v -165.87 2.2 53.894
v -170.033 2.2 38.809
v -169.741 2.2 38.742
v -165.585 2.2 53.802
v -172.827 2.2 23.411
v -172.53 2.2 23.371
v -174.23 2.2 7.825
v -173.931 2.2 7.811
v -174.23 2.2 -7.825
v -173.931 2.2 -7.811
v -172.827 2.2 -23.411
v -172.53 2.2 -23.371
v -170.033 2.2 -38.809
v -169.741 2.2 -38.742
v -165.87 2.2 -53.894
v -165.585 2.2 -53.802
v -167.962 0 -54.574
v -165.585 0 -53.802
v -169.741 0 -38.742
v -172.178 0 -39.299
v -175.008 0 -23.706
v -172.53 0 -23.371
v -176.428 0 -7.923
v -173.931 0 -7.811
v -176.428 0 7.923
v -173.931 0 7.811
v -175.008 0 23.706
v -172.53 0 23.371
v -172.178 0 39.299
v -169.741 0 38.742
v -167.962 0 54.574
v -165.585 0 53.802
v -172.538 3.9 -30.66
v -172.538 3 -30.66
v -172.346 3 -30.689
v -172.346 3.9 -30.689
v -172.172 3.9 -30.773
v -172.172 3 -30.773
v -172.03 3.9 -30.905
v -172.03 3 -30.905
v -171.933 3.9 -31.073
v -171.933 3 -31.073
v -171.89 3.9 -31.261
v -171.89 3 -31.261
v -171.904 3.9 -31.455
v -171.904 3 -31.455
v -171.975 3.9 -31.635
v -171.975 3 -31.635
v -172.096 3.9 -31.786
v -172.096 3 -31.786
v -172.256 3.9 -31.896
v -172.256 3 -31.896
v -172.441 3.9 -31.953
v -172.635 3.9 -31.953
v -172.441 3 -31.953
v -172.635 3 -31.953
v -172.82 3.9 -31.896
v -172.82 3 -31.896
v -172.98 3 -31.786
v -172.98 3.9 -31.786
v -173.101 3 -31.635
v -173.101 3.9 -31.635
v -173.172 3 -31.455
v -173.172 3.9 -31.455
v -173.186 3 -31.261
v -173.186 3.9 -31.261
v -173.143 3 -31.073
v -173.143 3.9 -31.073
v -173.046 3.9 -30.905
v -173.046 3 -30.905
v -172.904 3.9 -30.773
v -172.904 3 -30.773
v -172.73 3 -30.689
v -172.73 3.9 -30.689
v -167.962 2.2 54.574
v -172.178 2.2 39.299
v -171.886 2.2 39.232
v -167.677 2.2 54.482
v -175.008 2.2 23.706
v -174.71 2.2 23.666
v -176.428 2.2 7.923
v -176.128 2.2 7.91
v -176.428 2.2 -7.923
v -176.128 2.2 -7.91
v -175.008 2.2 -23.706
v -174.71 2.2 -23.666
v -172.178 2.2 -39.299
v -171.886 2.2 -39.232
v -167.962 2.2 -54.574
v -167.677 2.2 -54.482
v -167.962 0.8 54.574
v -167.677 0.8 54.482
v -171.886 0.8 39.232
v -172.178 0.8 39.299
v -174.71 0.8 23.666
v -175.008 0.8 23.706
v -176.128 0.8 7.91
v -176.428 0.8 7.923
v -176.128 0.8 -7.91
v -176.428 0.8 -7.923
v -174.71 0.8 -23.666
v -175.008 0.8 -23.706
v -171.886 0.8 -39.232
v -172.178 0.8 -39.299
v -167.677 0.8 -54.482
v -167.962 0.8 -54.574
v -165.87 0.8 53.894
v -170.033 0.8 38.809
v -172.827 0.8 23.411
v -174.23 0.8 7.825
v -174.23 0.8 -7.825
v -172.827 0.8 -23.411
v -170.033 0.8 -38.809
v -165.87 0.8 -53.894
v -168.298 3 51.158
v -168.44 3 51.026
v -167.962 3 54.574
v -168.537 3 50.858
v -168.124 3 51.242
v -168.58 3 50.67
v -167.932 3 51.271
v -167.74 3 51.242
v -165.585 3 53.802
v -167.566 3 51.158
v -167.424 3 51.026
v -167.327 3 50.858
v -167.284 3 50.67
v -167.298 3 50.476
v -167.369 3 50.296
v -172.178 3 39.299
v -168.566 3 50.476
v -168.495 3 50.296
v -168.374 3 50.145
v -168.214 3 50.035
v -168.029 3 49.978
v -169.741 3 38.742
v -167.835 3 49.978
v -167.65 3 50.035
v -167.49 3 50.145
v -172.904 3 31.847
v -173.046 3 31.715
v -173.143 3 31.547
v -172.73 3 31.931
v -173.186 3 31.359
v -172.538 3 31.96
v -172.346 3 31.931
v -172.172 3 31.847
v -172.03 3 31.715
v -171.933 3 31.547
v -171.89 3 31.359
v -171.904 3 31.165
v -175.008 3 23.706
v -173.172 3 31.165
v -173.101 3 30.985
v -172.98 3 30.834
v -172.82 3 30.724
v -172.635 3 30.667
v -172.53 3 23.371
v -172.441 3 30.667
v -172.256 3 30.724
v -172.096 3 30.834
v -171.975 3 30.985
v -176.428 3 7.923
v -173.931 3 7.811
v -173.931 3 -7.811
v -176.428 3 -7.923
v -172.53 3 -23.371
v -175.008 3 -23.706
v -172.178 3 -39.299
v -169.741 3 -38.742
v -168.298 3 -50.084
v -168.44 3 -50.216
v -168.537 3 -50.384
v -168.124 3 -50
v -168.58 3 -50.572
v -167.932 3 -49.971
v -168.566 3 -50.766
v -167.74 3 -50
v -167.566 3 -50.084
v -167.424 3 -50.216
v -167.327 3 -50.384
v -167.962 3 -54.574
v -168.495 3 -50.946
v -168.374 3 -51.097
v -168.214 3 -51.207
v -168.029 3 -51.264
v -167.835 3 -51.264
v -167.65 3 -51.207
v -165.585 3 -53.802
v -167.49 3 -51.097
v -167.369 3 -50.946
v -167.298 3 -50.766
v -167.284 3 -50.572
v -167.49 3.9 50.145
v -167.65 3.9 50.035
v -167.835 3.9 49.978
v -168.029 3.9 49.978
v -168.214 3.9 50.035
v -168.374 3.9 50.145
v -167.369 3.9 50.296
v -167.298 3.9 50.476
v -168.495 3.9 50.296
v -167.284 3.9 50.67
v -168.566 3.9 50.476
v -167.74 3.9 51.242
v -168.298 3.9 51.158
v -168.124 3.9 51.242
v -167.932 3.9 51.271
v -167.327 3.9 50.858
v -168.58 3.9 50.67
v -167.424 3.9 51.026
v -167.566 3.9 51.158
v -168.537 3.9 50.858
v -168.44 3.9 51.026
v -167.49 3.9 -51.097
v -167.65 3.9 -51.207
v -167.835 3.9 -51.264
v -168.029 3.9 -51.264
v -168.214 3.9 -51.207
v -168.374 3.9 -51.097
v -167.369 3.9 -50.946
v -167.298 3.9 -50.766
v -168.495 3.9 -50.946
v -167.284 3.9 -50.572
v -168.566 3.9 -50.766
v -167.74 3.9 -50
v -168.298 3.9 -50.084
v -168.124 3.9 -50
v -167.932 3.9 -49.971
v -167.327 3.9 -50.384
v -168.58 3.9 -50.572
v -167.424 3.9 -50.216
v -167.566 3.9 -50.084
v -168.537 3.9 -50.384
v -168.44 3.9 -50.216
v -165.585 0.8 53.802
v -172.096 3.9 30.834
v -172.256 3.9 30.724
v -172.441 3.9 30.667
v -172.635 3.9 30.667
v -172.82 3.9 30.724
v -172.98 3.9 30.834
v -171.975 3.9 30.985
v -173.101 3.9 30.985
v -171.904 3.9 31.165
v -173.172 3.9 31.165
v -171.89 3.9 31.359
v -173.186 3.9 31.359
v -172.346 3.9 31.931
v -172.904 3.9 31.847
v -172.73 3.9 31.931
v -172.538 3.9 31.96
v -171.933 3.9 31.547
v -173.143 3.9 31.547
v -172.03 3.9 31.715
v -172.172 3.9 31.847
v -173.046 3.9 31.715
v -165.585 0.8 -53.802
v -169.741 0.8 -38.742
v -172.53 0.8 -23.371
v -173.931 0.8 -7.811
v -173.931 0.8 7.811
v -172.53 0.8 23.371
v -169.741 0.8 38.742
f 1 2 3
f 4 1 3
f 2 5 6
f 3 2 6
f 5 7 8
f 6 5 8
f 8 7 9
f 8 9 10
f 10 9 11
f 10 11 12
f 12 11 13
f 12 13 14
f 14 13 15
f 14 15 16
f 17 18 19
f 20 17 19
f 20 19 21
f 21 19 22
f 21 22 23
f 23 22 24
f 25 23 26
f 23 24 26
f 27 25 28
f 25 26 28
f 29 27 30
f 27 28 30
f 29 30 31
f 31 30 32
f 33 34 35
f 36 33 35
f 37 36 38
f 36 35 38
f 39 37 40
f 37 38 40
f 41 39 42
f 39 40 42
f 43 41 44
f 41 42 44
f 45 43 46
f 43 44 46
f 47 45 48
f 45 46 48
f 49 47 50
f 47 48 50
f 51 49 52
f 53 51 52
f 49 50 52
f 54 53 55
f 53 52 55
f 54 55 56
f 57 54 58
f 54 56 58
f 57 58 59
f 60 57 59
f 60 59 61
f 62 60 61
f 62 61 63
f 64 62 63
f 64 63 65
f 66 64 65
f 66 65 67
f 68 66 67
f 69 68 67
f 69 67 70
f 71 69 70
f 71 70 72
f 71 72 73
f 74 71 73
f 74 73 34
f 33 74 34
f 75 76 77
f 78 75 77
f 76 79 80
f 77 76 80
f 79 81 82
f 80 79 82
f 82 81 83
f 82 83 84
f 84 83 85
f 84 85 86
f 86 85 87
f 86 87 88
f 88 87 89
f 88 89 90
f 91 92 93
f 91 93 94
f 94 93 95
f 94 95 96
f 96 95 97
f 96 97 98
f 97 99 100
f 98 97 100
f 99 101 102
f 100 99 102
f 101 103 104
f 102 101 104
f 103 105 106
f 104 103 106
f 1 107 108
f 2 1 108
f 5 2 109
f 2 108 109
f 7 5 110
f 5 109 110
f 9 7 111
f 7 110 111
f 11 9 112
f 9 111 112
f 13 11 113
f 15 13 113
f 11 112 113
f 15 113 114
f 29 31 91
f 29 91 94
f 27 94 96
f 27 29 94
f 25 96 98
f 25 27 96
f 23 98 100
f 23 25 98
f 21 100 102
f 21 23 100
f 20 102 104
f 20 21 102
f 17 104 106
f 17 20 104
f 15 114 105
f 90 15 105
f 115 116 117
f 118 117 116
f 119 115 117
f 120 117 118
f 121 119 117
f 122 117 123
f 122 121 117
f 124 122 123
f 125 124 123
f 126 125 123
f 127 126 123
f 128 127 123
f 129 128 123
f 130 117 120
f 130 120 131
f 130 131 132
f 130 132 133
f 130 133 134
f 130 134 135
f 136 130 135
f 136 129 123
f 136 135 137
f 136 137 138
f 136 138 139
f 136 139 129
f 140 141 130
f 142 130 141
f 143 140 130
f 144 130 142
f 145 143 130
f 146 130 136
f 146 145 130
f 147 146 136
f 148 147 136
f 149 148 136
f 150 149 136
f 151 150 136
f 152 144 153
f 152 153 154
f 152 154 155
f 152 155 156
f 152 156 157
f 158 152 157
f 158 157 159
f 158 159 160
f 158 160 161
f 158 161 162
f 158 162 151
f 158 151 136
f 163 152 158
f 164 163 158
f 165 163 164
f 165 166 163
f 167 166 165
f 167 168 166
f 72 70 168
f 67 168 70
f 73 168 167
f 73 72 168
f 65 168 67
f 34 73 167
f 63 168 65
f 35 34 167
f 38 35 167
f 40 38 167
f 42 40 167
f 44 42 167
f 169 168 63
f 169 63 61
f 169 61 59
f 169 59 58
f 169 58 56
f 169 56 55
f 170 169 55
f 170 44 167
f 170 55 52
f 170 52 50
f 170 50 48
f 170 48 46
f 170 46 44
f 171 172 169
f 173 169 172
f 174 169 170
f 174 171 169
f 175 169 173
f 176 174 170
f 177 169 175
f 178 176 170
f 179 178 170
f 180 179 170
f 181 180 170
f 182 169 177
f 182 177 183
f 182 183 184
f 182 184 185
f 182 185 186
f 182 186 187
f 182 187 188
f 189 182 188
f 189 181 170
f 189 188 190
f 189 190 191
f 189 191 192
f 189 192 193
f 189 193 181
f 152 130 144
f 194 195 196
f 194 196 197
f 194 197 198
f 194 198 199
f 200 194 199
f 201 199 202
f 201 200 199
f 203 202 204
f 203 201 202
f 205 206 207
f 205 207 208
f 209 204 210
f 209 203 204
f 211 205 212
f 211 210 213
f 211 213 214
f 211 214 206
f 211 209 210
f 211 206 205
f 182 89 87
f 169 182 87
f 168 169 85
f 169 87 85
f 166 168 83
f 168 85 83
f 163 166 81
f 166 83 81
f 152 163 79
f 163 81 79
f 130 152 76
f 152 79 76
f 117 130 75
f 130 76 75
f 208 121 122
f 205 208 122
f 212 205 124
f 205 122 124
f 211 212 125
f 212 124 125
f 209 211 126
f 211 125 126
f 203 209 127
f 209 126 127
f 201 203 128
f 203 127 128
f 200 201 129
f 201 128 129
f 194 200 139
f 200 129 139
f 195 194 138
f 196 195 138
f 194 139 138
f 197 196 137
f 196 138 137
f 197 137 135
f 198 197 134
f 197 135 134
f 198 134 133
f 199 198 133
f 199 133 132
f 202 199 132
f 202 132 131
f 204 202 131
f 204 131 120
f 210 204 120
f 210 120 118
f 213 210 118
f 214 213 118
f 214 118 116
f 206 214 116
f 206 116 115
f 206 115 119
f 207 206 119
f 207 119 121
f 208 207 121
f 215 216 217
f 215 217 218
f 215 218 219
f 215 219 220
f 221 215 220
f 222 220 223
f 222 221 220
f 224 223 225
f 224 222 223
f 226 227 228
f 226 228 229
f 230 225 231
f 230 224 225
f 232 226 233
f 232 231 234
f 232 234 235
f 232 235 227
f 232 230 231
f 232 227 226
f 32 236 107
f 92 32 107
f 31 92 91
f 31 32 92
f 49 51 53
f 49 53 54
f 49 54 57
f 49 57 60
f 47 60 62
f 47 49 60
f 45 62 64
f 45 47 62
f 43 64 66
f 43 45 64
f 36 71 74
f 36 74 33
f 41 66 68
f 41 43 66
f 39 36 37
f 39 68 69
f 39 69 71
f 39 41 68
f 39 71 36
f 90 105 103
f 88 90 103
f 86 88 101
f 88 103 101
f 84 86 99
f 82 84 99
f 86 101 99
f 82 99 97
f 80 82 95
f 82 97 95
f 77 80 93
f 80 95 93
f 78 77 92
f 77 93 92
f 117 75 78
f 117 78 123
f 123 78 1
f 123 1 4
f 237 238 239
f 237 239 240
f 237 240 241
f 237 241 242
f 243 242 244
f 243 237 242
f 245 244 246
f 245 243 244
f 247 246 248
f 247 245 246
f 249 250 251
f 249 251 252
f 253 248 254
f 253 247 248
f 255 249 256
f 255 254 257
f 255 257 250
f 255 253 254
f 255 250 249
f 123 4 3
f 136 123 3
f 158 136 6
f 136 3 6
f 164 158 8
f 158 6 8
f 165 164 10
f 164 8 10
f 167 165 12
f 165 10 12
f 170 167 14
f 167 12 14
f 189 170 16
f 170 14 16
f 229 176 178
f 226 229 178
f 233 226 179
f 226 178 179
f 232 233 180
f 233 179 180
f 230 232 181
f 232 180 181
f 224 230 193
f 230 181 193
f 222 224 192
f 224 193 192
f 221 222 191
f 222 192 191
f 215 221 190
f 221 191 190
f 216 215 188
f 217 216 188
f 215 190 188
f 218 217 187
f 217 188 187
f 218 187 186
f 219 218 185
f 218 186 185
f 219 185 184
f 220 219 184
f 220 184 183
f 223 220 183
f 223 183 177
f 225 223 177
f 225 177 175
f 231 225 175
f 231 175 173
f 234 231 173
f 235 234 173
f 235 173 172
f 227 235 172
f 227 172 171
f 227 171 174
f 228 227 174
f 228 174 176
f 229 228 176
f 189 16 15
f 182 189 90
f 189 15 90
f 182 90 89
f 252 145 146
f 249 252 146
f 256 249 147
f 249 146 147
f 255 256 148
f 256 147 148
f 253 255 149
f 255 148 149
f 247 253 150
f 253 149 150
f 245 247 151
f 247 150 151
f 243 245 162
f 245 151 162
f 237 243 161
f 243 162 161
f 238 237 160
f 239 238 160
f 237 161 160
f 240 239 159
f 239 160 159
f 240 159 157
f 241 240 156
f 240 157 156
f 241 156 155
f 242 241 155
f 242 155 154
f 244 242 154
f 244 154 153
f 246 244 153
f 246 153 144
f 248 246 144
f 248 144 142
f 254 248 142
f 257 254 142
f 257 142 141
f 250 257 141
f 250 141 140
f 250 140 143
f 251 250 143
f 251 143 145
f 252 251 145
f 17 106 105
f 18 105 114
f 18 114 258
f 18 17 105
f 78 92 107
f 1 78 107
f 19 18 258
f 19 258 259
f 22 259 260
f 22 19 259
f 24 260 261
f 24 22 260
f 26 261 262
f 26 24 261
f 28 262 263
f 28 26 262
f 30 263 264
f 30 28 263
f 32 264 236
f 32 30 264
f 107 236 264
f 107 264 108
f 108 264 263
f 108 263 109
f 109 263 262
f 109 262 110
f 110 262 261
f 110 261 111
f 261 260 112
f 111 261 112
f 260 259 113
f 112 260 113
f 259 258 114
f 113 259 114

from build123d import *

# Parameters (mm, degrees)
BOSS_EXTRUDE1_DEPTH = 0.8
BOSS_EXTRUDE2_DEPTH = 1.4
BOSS_EXTRUDE3_DEPTH = 0.8
SKETCH1_3_R         = 0.65
BOSS_EXTRUDE4_DEPTH = 3.9


with BuildPart() as part:
    # Sketch1 → Boss-Extrude1 (new body)
    with BuildSketch(Plane(origin=(0, 0, 0), x_dir=(1, 0, 0), z_dir=(0, 1, 0))):
        with BuildLine():
            Line((-167.962153719, -54.574211965), (-165.584512428, -53.801669479))
            ThreePointArc((-165.584512428, -53.801669479), (-174.105859737, 0), (-165.584512428, 53.801669479))
            Line((-165.584512428, 53.801669479), (-167.962153719, 54.574211965))
            ThreePointArc((-167.962153719, 54.574211965), (-176.605859737, 0), (-167.962153719, -54.574211965))
        make_face()
    extrude(amount=BOSS_EXTRUDE1_DEPTH)

    # Sketch2 → Boss-Extrude2 (add)
    with BuildSketch(Plane(origin=(0, 0.8, 0), x_dir=(1, 0, 0), z_dir=(0, 1, 0))):
        with BuildLine():
            Line((-165.869829383, 53.894374577), (-167.676836764, 54.481506867))
            ThreePointArc((-167.676836764, 54.481506867), (-176.305859737, 0), (-167.676836764, -54.481506867))
            Line((-167.676836764, -54.481506867), (-165.869829383, -53.894374577))
            ThreePointArc((-165.869829383, -53.894374577), (-174.405859737, 0), (-165.869829383, 53.894374577))
        make_face()
    extrude(amount=BOSS_EXTRUDE2_DEPTH)

    # Sketch3 → Boss-Extrude3 (add)
    with BuildSketch(Plane(origin=(0, 2.2, 0), x_dir=(1, 0, 0), z_dir=(0, 1, 0))):
        with BuildLine():
            Line((-167.962153719, -54.574211965), (-165.584512428, -53.801669479))
            ThreePointArc((-165.584512428, -53.801669479), (-174.105859737, 0), (-165.584512428, 53.801669479))
            Line((-165.584512428, 53.801669479), (-167.962153719, 54.574211965))
            ThreePointArc((-167.962153719, 54.574211965), (-176.605859737, 0), (-167.962153719, -54.574211965))
        make_face()
    extrude(amount=BOSS_EXTRUDE3_DEPTH)

    # Sketch1<3> → Boss-Extrude4 (add)
    with BuildSketch(Plane(origin=(0, 0, 0), x_dir=(1, 0, 0), z_dir=(0, 1, 0))):
        with Locations((-172.538, -31.31)):
            Circle(SKETCH1_3_R)
        with Locations((-172.538, 31.31)):
            Circle(SKETCH1_3_R)
        with Locations((-167.932, 50.621)):
            Circle(SKETCH1_3_R)
        with Locations((-167.932, -50.621)):
            Circle(SKETCH1_3_R)
    extrude(amount=BOSS_EXTRUDE4_DEPTH)


solid = part.part
